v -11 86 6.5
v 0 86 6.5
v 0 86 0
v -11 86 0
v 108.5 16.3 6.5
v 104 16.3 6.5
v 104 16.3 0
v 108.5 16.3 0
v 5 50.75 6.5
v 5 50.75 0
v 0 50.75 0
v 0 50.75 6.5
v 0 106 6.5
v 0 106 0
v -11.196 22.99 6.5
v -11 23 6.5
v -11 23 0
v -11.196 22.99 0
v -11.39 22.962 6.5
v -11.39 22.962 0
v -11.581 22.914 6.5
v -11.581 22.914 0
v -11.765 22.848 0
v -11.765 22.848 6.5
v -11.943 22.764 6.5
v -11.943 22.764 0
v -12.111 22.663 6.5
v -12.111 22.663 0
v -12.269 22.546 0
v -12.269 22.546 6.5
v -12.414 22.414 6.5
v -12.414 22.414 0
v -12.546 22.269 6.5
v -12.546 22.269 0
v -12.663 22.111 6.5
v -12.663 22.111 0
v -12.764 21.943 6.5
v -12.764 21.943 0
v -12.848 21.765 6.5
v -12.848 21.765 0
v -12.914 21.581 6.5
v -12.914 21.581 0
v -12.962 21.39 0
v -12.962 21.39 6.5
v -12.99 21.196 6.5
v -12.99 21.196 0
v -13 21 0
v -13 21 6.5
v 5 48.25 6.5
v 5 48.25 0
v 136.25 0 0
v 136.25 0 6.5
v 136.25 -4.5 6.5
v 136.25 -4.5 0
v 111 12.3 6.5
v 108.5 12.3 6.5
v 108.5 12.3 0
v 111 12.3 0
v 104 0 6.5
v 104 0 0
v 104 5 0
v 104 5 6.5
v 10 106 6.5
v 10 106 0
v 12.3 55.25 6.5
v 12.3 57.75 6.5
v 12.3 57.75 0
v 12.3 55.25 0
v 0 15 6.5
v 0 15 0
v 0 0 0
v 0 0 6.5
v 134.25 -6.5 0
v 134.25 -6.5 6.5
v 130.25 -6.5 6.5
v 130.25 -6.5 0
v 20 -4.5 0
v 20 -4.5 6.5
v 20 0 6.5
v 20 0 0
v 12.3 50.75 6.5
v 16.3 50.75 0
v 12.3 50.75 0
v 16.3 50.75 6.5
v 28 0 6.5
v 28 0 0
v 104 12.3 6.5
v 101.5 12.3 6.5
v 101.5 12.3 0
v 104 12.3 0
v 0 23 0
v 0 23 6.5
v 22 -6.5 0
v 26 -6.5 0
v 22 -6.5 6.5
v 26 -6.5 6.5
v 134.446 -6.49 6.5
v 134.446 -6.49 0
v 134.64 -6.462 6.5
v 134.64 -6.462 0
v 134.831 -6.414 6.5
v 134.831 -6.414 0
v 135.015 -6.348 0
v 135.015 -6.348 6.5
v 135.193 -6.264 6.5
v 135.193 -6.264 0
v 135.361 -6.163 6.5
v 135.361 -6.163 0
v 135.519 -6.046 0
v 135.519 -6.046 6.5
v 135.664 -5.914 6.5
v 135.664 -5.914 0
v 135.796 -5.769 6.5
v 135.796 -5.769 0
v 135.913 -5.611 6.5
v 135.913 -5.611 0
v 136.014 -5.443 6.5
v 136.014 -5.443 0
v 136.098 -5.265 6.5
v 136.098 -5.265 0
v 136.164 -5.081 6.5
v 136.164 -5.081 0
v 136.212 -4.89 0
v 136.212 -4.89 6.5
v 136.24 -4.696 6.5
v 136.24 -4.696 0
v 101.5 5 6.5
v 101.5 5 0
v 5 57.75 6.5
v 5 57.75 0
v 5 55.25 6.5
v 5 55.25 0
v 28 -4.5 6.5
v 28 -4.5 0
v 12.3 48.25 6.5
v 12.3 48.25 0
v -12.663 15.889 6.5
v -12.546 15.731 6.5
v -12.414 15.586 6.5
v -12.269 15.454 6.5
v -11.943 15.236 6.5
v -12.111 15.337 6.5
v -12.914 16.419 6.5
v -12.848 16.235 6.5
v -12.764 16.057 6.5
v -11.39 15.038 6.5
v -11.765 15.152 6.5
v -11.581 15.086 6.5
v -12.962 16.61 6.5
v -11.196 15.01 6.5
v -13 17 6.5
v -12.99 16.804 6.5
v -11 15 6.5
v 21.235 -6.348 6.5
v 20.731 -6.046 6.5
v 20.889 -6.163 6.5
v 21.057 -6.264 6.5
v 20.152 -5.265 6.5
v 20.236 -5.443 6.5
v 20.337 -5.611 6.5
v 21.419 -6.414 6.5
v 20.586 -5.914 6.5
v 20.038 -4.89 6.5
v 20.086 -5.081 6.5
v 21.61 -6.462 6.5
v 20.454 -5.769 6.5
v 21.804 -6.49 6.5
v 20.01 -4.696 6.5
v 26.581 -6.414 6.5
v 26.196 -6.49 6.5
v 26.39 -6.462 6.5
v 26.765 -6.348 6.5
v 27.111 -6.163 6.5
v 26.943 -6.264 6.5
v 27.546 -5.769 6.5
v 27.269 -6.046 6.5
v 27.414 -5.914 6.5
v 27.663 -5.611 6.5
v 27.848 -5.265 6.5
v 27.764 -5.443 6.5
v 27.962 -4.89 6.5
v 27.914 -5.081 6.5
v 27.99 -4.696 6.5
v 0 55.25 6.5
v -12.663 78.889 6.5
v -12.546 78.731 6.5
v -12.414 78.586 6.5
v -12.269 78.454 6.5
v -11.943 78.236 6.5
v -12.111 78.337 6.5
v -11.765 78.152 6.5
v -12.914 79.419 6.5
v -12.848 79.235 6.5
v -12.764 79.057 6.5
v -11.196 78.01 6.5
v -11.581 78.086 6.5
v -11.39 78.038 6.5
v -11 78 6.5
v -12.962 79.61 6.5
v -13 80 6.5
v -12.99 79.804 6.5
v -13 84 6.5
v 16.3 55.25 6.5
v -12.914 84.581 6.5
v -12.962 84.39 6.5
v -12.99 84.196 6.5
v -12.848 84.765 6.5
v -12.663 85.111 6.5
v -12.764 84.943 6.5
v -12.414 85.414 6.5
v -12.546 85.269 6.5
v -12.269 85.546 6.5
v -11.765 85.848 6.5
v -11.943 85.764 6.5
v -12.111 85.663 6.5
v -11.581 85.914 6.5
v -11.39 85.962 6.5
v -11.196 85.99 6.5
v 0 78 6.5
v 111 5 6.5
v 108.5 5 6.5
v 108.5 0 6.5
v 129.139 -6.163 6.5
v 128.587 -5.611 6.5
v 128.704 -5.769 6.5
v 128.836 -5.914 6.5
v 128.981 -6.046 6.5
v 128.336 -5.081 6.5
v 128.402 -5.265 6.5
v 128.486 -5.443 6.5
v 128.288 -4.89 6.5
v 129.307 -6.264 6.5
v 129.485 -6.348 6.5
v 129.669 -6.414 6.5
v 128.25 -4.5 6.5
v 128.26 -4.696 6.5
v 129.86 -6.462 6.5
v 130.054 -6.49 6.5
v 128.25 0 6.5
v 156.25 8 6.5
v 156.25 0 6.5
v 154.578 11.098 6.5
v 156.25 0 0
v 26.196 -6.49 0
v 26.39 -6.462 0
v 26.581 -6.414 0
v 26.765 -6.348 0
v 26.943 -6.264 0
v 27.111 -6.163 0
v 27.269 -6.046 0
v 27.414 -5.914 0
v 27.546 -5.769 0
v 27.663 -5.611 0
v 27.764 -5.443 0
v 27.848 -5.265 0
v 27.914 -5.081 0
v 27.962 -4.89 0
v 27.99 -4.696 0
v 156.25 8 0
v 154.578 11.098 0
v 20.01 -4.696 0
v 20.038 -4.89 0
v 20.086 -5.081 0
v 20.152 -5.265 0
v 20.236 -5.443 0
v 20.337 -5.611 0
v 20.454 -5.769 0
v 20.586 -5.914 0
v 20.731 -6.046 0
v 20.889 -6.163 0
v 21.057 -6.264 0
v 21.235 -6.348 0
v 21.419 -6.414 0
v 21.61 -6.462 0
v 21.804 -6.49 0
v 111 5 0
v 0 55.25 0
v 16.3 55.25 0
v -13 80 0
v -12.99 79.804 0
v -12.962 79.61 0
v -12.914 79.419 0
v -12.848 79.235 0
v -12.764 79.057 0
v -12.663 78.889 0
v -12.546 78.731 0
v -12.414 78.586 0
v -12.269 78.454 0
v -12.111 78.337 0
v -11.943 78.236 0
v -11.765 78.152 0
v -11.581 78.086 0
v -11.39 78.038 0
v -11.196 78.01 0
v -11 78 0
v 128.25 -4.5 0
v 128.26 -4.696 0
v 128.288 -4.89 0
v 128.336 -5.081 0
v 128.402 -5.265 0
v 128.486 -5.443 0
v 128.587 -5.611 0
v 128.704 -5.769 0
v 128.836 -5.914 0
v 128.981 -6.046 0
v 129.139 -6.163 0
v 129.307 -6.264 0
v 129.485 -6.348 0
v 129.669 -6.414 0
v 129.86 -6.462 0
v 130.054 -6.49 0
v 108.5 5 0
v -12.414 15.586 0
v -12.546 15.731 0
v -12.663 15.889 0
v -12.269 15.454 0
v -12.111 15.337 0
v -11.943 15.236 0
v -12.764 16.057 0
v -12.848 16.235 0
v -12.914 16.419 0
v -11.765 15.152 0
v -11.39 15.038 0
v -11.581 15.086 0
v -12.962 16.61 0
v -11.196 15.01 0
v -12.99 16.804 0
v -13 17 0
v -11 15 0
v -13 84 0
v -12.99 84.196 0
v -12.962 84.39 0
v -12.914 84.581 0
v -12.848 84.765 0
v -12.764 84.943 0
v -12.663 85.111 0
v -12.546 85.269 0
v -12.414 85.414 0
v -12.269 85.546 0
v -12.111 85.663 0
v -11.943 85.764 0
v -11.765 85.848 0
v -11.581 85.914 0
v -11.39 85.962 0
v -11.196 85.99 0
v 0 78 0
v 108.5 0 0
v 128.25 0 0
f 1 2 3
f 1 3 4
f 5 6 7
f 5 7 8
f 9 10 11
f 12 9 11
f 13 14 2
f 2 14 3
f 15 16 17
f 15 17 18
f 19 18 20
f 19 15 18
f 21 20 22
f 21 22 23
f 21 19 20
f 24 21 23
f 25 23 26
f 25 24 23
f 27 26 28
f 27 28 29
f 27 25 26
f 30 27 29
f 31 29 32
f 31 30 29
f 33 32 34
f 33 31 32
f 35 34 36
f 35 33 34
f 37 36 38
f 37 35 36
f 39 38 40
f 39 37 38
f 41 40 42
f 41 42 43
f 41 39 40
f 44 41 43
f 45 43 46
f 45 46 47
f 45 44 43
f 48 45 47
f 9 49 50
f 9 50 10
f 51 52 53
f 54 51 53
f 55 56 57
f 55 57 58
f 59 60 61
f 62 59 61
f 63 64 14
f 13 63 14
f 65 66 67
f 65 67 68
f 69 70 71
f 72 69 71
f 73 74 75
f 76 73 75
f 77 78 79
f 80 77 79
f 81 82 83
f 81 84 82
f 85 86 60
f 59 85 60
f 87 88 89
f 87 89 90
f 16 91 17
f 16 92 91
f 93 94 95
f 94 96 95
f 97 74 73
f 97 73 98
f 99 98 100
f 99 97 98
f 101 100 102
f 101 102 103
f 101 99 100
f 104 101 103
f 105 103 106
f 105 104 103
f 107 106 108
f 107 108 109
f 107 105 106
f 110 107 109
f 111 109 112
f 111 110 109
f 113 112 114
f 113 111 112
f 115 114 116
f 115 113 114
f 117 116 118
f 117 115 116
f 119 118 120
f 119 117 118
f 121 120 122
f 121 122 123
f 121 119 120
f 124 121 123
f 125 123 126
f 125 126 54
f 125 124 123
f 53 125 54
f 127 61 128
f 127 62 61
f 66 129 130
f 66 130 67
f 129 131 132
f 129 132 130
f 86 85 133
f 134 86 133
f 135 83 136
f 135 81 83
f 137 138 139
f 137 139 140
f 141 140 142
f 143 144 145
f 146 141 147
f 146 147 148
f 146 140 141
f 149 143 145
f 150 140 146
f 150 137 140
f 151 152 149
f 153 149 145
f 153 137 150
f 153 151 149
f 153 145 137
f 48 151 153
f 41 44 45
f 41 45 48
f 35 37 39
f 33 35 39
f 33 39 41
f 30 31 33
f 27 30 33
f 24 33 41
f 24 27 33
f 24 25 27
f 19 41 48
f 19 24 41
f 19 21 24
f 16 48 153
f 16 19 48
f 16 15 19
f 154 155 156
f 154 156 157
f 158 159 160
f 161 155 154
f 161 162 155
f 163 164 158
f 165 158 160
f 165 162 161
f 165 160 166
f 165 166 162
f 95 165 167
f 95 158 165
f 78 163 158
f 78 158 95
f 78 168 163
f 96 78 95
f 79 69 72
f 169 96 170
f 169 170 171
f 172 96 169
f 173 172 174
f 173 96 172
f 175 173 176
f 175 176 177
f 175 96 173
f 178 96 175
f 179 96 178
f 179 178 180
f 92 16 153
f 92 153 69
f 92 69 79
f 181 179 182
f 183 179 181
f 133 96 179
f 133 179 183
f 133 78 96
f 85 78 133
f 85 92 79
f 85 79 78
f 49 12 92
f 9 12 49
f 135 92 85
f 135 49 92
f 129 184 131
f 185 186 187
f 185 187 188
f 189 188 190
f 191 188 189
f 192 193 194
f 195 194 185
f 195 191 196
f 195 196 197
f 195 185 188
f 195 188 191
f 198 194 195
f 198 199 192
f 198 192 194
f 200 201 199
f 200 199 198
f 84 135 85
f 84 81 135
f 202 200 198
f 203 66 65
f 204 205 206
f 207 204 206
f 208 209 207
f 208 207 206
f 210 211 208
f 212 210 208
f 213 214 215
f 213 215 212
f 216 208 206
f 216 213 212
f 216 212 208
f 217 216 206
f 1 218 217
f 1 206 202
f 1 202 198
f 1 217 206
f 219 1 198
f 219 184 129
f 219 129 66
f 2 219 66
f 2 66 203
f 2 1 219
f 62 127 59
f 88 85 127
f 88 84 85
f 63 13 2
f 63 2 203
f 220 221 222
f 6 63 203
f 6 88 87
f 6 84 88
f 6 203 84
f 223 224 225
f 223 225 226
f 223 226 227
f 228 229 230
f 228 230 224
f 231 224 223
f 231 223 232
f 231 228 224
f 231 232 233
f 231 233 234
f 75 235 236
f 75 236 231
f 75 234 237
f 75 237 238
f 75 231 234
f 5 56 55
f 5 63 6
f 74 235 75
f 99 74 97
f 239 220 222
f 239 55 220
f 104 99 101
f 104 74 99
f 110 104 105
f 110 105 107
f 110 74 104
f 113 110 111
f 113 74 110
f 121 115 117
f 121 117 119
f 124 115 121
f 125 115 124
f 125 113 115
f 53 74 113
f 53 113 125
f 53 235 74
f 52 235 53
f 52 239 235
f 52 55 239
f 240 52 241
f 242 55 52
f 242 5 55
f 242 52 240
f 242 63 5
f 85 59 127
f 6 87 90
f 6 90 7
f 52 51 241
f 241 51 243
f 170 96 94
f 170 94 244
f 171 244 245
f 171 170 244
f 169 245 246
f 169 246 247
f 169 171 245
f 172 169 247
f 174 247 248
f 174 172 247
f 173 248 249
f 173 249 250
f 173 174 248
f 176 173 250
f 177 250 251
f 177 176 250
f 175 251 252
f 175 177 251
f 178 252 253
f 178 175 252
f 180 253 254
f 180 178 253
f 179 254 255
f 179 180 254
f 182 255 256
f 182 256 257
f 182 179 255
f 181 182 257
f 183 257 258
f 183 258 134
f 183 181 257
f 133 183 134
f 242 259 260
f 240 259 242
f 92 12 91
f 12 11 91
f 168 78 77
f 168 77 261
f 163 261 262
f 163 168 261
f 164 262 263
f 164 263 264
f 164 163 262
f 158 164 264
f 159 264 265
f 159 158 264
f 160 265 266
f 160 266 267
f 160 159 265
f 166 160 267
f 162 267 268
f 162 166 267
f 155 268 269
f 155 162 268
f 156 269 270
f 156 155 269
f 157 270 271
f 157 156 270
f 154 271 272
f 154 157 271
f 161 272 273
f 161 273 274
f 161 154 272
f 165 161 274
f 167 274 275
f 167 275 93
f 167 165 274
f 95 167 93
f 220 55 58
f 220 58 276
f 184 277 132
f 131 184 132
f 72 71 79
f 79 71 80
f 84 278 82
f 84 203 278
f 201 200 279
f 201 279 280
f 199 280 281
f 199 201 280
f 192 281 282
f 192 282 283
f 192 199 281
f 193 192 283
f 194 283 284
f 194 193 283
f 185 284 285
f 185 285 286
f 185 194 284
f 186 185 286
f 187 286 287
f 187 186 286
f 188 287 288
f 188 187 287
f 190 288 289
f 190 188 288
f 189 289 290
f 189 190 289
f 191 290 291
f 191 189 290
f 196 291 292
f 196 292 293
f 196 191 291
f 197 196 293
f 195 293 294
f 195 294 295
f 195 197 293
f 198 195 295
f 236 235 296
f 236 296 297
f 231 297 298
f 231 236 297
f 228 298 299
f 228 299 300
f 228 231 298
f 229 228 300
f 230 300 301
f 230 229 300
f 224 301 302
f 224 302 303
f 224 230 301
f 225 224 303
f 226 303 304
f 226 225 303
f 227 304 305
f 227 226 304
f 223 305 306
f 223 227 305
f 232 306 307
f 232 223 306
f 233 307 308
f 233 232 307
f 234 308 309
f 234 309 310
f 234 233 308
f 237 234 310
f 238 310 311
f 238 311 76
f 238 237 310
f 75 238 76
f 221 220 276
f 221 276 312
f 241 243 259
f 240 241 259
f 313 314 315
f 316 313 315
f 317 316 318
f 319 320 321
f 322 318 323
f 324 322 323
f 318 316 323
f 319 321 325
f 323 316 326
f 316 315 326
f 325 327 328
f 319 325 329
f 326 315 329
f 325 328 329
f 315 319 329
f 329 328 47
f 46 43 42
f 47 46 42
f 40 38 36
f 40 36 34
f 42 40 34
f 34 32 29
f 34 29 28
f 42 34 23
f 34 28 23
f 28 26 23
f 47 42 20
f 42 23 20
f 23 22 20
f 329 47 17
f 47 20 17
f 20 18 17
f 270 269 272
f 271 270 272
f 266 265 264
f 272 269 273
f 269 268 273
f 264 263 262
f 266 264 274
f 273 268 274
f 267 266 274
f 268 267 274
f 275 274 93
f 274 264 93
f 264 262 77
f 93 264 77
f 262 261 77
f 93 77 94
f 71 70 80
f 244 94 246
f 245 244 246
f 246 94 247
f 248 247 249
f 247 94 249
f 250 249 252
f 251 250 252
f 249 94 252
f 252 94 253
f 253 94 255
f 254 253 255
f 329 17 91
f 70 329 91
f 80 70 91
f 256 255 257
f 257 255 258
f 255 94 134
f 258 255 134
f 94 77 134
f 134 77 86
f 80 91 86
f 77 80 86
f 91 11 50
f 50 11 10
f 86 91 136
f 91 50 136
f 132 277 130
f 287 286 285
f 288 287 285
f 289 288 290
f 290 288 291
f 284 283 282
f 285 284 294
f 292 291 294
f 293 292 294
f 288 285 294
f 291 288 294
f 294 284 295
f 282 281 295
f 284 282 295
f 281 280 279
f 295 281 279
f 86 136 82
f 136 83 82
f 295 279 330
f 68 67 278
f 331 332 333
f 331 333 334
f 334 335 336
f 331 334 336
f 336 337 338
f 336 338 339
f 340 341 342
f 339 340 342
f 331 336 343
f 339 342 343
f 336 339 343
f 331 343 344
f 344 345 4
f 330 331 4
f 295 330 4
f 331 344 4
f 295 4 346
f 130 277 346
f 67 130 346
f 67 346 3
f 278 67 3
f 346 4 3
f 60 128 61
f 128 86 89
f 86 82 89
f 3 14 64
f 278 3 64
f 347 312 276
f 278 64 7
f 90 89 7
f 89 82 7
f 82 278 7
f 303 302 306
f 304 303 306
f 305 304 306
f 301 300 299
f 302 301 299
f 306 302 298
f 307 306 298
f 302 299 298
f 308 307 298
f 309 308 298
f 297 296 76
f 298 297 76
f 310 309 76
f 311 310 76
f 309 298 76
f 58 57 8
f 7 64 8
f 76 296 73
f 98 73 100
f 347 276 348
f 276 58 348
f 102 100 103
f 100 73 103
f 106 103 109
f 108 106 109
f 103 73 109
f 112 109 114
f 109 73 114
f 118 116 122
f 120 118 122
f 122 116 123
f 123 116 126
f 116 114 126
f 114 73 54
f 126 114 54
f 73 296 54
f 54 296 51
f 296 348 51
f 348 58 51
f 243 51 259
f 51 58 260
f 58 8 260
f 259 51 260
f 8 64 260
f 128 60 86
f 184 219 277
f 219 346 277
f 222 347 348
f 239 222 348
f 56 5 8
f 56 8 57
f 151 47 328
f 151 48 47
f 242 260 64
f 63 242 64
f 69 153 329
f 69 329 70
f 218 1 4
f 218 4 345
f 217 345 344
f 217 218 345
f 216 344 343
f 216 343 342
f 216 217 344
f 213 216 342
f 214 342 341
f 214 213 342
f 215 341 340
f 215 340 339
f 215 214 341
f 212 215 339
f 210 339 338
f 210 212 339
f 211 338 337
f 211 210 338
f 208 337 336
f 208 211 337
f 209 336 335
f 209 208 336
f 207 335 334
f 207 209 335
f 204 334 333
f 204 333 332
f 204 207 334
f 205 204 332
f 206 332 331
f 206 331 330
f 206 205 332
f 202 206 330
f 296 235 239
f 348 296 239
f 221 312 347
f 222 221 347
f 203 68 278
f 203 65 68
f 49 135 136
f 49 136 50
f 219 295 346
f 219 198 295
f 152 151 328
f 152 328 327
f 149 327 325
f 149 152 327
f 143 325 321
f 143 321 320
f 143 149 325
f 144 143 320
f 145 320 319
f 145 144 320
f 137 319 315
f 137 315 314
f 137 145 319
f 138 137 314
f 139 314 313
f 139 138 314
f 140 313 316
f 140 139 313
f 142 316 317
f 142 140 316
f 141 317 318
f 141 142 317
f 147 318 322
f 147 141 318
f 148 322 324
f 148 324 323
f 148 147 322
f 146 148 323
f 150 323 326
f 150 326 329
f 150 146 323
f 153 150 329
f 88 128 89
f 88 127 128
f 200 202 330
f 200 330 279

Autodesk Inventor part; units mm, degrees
ref_plane "YZ Plane" through (0, 0, 0) normal (1, 0, 0) x (0, 1, 0)
ref_plane "XZ Plane" through (0, 0, 0) normal (0, 1, 0) x (-1, 0, 0)
ref_plane "XY Plane" through (0, 0, 0) normal (0, 0, 1) x (1, 0, 0)
sketch "Sketch1" plane through (0, 0, 0) normal (0, 0, 1) x (1, 0, 0)
  line L0 (0, 106) -> (0, 0)
  line L1 (0, 0) -> (156.25, 0)
  line L2 (156.25, 0) -> (156.25, 10)
  line L3 (156.25, 10) -> (10, 106)
  line L4 (10, 106) -> (0, 106)
  dimension "d0" = 156.25
  dimension "d1" = 106
  dimension "d2" = 10
  dimension "d3" = 10
extrude "Extrusion1" add sketch "Sketch1" along normal blind 6.5
sketch "Sketch2" plane through (0, 0, 6.5) normal (0, 0, 1) x (1, 0, 0)
  line L0 (0, 106) -> (0, 0) projected
  line L1 (0, 0) -> (156.25, 0) projected
  line L2 (156.25, 0) -> (156.25, 10) projected
  line L3 (16.3, 55.25) -> (16.3, 50.75)
  line L4 (0, 50.75) -> (0, 55.25)
  line L5 (5, 57.75) -> (12.3, 57.75)
  line L6 (12.3, 48.25) -> (5, 48.25)
  line L7 (0, 55.25) -> (5, 55.25)
  line L8 (12.3, 55.25) -> (16.3, 55.25)
  line L9 (16.3, 50.75) -> (12.3, 50.75)
  line L10 (5, 50.75) -> (0, 50.75)
  line L11 (5, 48.25) -> (5, 50.75)
  line L12 (5, 55.25) -> (5, 57.75)
  line L13 (12.3, 57.75) -> (12.3, 55.25)
  line L14 (12.3, 50.75) -> (12.3, 48.25)
  line L15 (104, 16.3) -> (108.5, 16.3)
  line L16 (108.5, 0) -> (104, 0)
  line L17 (111, 12.3) -> (111, 5)
  line L18 (101.5, 5) -> (101.5, 12.3)
  line L19 (101.5, 12.3) -> (104, 12.3)
  line L20 (108.5, 12.3) -> (111, 12.3)
  line L21 (111, 5) -> (108.5, 5)
  line L22 (104, 5) -> (101.5, 5)
  line L23 (104, 0) -> (104, 5)
  line L24 (104, 12.3) -> (104, 16.3)
  line L25 (108.5, 16.3) -> (108.5, 12.3)
  line L26 (108.5, 5) -> (108.5, 0)
  point P0 (16.3, 53)
  point P1 (0, 53)
  point P2 (106.25, 16.3)
  dimension "d6" = 4.5
  dimension "d7" = 2.5
  dimension "d8" = 2.5
  dimension "d9" = 5
  dimension "d10" = 7.3
  dimension "d11" = 4
  dimension "d12" = 4.5
  dimension "d13" = 5
  dimension "d14" = 7.3
  dimension "d15" = 4
  dimension "d16" = 2.5
  dimension "d17" = 2.5
  dimension "d18" = 50
extrude "Extrusion2" cut sketch "Sketch2" against normal through all
sketch "Sketch3" plane through (0, 0, 6.5) normal (0, 0, 1) x (1, 0, 0)
  line L0 (0, 50.75) -> (0, 0) projected
  line L1 (0, 0) -> (104, 0) projected
  line L2 (108.5, 0) -> (156.25, 0) projected
  line L3 (10, 106) -> (0, 106) projected
  line L4 (0, 106) -> (0, 55.25) projected
  line L5 (0, 86) -> (-11, 86)
  line L6 (-13, 84) -> (-13, 80)
  line L7 (-11, 78) -> (0, 78)
  line L8 (0, 78) -> (0, 86)
  line L9 (0, 23) -> (-11, 23)
  line L10 (-13, 21) -> (-13, 17)
  line L11 (-11, 15) -> (0, 15)
  line L12 (0, 15) -> (0, 23)
  line L13 (20, 0) -> (28, 0)
  line L14 (28, 0) -> (28, -4.5)
  line L15 (26, -6.5) -> (22, -6.5)
  line L16 (20, -4.5) -> (20, 0)
  line L17 (128.25, 0) -> (136.25, 0)
  line L18 (136.25, 0) -> (136.25, -4.5)
  line L19 (134.25, -6.5) -> (130.25, -6.5)
  line L20 (128.25, -4.5) -> (128.25, 0)
  arc A0 (-11, 86) -> (-13, 84) centre (-11, 84) ccw
  arc A1 (-13, 80) -> (-11, 78) centre (-11, 80) ccw
  arc A2 (-11, 23) -> (-13, 21) centre (-11, 21) ccw
  arc A3 (-13, 17) -> (-11, 15) centre (-11, 17) ccw
  arc A4 (20, -4.5) -> (22, -6.5) centre (22, -4.5) ccw
  arc A5 (26, -6.5) -> (28, -4.5) centre (26, -4.5) ccw
  arc A6 (128.25, -4.5) -> (130.25, -6.5) centre (130.25, -4.5) ccw
  arc A7 (134.25, -6.5) -> (136.25, -4.5) centre (134.25, -4.5) ccw
  dimension "d21" = 2
  dimension "d22" = 8
  dimension "d23" = 8
  dimension "d24" = 8
  dimension "d25" = 8
  dimension "d26" = 13
  dimension "d27" = 6.5
  dimension "d28" = 15
  dimension "d29" = 20
  dimension "d30" = 20
  dimension "d31" = 20
extrude "Extrusion3" add sketch "Sketch3" against normal blind 6.5
chamfer "Chamfer1" distance 2 angle 45 1 edges at (156.25, 10, 3.25)
properties part number "wiring_brace" material "Plywood, Finish"
